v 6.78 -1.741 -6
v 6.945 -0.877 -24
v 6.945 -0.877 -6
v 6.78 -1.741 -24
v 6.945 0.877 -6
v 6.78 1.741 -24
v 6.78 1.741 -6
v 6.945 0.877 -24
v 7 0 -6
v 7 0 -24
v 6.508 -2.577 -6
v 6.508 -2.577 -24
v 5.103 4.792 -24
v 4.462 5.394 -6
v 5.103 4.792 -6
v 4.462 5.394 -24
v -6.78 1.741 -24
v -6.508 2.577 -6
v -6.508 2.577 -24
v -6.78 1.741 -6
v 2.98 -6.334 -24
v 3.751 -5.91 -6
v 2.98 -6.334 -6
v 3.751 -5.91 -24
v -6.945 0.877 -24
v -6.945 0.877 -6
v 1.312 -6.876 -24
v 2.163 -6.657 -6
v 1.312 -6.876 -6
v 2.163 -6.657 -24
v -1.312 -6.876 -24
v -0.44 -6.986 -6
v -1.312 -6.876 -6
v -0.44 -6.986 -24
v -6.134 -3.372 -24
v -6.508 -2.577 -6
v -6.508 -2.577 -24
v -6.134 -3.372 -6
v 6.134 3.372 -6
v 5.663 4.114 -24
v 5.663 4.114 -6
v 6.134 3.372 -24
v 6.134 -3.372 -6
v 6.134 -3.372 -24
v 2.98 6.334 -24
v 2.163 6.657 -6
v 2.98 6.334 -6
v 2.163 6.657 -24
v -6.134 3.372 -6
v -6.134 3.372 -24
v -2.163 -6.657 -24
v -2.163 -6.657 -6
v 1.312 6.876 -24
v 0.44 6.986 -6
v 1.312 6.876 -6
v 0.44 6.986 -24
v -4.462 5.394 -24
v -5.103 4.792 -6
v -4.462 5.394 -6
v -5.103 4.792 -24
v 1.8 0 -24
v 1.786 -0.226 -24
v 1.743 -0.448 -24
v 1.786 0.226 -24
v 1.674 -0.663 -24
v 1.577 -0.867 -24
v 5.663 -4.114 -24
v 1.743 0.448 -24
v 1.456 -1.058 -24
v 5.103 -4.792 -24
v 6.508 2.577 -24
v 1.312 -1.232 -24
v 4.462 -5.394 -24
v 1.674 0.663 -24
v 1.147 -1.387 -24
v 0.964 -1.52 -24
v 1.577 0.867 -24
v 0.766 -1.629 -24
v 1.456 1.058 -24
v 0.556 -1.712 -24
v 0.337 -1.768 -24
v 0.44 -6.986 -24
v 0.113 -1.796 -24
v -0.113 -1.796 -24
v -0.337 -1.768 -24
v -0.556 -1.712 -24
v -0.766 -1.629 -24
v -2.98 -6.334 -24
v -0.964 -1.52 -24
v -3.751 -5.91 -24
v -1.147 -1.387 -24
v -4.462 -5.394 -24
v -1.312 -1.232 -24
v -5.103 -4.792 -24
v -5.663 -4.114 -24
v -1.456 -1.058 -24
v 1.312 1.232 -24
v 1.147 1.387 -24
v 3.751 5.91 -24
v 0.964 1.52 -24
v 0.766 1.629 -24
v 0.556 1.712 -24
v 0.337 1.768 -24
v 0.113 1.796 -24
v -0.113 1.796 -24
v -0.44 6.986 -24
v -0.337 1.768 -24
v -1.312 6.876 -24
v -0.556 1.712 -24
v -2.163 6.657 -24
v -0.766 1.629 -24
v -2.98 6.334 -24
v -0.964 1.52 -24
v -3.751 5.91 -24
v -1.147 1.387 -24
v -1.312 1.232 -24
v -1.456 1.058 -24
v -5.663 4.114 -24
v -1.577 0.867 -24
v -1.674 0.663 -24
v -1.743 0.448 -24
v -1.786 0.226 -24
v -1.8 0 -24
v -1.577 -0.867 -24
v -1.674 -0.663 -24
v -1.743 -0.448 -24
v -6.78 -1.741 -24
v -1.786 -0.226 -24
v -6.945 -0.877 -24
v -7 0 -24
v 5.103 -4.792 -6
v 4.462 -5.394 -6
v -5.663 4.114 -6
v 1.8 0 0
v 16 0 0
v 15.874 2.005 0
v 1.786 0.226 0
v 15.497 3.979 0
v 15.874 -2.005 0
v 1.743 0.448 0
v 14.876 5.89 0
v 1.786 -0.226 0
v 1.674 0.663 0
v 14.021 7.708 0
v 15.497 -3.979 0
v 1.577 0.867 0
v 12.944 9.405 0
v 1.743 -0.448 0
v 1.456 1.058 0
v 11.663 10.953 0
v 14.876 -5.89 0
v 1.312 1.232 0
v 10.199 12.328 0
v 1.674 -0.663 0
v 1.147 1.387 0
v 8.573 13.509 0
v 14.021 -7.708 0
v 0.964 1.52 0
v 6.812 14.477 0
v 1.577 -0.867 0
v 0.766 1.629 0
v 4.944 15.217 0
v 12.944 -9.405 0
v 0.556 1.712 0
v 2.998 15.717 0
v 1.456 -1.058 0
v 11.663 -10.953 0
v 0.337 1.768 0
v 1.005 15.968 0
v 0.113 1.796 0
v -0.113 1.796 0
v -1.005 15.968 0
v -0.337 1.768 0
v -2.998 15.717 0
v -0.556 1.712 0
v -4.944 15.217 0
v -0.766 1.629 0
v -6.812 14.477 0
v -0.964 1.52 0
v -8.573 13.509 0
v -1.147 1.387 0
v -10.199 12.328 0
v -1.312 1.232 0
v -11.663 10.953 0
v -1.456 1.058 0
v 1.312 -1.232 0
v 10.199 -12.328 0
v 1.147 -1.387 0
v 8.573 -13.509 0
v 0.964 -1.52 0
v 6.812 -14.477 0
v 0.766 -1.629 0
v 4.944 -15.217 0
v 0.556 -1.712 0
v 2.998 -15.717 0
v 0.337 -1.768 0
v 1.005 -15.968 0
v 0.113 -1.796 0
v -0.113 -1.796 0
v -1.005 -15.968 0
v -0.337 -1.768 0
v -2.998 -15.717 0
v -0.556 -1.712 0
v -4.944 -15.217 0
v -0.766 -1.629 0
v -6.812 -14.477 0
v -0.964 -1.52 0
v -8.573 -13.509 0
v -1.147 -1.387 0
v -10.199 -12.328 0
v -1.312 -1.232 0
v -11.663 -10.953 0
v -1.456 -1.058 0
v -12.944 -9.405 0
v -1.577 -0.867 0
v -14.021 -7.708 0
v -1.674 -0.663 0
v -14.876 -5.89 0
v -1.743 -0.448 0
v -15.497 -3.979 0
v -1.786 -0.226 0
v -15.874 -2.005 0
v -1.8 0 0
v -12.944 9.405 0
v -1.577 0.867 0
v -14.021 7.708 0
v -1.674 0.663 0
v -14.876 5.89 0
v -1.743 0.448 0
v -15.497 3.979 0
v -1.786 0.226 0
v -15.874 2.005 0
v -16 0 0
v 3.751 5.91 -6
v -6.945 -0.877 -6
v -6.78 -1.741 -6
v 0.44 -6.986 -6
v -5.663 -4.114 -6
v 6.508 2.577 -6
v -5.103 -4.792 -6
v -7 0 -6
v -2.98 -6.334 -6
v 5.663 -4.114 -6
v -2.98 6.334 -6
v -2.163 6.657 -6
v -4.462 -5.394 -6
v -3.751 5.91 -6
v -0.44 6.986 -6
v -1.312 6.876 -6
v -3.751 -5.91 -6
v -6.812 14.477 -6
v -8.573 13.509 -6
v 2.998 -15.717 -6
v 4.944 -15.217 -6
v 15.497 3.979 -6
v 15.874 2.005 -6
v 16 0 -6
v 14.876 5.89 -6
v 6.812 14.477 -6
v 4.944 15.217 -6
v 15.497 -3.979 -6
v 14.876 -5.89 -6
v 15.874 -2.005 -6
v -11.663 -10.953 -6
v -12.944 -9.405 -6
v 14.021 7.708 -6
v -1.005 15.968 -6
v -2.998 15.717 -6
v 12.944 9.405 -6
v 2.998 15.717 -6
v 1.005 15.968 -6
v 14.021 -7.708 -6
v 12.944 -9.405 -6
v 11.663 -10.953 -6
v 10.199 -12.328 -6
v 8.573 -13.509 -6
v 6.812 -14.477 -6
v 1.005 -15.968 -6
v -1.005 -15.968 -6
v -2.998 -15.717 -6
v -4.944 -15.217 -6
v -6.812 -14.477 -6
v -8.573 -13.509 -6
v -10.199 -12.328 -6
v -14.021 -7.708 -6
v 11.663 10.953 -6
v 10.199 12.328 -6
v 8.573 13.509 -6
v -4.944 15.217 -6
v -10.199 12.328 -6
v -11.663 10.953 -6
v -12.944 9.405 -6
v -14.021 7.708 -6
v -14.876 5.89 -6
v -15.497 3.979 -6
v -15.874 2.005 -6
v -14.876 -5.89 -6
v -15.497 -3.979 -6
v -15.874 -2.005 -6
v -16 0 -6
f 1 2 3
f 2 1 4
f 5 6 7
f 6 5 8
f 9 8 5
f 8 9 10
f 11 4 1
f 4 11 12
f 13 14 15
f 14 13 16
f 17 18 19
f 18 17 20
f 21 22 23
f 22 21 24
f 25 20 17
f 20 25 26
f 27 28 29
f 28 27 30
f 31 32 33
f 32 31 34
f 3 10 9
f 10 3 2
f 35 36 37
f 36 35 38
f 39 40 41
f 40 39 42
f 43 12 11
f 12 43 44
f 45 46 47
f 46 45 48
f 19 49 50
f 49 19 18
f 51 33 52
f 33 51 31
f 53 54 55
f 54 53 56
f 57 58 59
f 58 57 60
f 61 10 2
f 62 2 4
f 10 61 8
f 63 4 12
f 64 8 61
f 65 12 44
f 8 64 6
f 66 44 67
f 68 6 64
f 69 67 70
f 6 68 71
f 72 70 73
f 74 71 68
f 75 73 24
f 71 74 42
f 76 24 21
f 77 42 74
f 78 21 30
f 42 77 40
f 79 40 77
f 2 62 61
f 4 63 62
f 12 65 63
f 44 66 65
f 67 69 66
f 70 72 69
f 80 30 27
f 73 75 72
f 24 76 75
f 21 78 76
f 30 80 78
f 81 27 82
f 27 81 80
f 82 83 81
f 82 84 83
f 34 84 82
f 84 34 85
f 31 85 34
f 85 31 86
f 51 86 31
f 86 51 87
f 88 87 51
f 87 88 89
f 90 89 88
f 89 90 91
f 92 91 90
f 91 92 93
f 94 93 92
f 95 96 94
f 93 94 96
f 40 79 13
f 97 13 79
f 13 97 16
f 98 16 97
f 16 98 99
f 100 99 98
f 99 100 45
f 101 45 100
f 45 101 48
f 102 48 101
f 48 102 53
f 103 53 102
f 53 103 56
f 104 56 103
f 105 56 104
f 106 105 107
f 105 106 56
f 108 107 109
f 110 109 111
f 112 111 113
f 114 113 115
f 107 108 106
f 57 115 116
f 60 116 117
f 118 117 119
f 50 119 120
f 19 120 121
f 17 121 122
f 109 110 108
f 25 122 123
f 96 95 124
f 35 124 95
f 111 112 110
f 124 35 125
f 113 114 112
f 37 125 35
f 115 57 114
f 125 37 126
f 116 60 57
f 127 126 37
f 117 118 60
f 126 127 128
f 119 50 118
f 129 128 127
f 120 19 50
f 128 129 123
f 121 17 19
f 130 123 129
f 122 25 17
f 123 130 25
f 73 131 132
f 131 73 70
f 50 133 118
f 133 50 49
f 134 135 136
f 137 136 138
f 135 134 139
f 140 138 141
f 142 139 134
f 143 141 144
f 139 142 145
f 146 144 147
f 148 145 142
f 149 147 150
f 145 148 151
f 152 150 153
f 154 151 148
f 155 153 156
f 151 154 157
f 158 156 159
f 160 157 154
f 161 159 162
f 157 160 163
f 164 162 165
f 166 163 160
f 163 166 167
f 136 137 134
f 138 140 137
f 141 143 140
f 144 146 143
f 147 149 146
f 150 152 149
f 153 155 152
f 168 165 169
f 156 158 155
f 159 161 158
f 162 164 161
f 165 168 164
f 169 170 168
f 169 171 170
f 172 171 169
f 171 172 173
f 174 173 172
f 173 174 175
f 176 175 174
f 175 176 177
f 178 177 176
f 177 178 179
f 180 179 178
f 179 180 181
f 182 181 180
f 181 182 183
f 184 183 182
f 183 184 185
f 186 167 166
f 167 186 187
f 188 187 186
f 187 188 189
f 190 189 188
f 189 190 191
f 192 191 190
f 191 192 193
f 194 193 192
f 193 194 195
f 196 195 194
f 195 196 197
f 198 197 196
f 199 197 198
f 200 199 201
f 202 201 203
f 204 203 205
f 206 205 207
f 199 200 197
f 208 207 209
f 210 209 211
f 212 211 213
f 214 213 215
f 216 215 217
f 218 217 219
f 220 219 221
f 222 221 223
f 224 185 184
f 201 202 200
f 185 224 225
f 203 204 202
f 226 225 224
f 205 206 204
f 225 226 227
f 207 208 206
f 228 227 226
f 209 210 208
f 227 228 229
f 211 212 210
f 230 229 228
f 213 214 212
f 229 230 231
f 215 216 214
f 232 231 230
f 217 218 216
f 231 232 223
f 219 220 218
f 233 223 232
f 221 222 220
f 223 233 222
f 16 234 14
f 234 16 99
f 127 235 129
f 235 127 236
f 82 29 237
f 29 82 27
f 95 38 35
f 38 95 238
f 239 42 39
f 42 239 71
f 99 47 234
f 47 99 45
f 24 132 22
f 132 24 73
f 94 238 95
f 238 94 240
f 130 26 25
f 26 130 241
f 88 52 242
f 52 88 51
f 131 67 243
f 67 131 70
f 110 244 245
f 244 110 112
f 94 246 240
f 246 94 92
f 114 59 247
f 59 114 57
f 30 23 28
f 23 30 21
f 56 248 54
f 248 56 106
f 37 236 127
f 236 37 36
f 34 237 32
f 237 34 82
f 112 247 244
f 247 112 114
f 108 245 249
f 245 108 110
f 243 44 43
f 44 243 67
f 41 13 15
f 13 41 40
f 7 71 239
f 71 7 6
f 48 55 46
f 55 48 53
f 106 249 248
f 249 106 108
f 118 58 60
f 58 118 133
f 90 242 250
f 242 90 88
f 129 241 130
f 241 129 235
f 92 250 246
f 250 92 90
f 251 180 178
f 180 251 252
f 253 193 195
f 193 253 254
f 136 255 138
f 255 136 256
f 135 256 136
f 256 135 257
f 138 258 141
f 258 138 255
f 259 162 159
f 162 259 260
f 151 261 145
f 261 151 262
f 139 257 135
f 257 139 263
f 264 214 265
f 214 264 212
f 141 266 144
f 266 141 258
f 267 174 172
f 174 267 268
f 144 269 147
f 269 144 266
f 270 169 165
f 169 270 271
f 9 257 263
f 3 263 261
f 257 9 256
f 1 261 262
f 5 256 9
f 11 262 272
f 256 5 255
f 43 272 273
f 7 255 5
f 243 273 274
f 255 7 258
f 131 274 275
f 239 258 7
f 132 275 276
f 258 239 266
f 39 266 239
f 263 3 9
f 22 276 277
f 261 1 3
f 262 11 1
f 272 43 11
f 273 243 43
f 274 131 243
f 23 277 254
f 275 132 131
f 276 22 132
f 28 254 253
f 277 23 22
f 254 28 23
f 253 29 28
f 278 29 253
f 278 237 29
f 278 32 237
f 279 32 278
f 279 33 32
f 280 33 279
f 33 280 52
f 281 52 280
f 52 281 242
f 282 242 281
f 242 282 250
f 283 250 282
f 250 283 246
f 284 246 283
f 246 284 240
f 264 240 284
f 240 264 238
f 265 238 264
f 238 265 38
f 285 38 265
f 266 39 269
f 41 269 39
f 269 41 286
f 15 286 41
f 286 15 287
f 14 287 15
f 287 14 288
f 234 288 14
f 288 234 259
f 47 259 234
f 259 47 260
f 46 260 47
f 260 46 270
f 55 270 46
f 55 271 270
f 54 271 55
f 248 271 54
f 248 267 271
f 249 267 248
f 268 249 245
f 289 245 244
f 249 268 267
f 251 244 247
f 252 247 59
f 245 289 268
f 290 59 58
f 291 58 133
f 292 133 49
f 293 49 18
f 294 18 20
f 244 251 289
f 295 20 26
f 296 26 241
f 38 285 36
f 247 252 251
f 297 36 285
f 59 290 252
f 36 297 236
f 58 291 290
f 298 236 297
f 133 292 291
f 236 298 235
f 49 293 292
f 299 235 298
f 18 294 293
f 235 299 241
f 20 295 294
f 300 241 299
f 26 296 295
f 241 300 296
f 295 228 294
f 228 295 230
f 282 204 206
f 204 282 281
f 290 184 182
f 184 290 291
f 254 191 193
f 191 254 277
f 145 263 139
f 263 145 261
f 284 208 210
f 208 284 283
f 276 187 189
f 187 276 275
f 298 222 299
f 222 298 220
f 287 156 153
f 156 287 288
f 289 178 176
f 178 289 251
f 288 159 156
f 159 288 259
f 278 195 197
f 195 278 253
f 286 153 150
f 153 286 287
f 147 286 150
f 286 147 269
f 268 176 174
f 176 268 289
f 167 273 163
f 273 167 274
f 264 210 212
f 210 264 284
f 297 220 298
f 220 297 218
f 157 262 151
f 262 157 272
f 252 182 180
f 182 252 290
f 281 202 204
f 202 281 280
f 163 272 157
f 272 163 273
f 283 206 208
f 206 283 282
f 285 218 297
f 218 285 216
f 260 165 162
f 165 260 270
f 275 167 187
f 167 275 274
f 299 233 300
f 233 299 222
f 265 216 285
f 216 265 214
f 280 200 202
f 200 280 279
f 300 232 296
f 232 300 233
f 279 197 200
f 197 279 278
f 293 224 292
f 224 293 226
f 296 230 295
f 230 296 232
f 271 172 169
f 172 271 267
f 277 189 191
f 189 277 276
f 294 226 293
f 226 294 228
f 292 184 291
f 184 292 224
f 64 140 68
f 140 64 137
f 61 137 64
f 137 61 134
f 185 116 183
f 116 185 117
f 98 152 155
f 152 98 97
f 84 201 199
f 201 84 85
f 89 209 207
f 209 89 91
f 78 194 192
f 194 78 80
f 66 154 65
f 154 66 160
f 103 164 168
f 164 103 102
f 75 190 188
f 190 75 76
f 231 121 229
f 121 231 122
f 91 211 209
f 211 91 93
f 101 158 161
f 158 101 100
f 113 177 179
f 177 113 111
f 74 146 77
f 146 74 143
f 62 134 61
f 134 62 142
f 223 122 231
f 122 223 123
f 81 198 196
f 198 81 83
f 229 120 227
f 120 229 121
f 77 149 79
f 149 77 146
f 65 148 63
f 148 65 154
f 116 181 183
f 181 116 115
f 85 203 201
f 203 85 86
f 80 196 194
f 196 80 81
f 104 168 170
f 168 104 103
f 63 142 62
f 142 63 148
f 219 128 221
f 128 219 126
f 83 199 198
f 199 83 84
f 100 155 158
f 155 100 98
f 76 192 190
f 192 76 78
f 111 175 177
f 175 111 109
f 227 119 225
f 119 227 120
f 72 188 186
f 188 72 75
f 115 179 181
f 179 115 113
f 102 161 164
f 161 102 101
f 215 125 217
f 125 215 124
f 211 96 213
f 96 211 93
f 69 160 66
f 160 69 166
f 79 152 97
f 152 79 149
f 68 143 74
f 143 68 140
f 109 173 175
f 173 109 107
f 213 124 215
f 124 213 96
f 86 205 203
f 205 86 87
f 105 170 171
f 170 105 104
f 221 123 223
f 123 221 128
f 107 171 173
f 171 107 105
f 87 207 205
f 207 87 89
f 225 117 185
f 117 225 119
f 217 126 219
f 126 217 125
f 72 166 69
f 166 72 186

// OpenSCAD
$fn = 50;


difference() {
	union() {
		translate(v = [0, 0, -24.0000000000]) {
			cylinder(h = 24, r = 7.0000000000);
		}
		translate(v = [0, 0, -6.0000000000]) {
			cylinder(h = 6, r = 16.0000000000);
		}
	}
	union() {
		#translate(v = [0, 0, -24]) {
			cylinder(h = 24, r = 1.8000000000);
		}
	}
}
